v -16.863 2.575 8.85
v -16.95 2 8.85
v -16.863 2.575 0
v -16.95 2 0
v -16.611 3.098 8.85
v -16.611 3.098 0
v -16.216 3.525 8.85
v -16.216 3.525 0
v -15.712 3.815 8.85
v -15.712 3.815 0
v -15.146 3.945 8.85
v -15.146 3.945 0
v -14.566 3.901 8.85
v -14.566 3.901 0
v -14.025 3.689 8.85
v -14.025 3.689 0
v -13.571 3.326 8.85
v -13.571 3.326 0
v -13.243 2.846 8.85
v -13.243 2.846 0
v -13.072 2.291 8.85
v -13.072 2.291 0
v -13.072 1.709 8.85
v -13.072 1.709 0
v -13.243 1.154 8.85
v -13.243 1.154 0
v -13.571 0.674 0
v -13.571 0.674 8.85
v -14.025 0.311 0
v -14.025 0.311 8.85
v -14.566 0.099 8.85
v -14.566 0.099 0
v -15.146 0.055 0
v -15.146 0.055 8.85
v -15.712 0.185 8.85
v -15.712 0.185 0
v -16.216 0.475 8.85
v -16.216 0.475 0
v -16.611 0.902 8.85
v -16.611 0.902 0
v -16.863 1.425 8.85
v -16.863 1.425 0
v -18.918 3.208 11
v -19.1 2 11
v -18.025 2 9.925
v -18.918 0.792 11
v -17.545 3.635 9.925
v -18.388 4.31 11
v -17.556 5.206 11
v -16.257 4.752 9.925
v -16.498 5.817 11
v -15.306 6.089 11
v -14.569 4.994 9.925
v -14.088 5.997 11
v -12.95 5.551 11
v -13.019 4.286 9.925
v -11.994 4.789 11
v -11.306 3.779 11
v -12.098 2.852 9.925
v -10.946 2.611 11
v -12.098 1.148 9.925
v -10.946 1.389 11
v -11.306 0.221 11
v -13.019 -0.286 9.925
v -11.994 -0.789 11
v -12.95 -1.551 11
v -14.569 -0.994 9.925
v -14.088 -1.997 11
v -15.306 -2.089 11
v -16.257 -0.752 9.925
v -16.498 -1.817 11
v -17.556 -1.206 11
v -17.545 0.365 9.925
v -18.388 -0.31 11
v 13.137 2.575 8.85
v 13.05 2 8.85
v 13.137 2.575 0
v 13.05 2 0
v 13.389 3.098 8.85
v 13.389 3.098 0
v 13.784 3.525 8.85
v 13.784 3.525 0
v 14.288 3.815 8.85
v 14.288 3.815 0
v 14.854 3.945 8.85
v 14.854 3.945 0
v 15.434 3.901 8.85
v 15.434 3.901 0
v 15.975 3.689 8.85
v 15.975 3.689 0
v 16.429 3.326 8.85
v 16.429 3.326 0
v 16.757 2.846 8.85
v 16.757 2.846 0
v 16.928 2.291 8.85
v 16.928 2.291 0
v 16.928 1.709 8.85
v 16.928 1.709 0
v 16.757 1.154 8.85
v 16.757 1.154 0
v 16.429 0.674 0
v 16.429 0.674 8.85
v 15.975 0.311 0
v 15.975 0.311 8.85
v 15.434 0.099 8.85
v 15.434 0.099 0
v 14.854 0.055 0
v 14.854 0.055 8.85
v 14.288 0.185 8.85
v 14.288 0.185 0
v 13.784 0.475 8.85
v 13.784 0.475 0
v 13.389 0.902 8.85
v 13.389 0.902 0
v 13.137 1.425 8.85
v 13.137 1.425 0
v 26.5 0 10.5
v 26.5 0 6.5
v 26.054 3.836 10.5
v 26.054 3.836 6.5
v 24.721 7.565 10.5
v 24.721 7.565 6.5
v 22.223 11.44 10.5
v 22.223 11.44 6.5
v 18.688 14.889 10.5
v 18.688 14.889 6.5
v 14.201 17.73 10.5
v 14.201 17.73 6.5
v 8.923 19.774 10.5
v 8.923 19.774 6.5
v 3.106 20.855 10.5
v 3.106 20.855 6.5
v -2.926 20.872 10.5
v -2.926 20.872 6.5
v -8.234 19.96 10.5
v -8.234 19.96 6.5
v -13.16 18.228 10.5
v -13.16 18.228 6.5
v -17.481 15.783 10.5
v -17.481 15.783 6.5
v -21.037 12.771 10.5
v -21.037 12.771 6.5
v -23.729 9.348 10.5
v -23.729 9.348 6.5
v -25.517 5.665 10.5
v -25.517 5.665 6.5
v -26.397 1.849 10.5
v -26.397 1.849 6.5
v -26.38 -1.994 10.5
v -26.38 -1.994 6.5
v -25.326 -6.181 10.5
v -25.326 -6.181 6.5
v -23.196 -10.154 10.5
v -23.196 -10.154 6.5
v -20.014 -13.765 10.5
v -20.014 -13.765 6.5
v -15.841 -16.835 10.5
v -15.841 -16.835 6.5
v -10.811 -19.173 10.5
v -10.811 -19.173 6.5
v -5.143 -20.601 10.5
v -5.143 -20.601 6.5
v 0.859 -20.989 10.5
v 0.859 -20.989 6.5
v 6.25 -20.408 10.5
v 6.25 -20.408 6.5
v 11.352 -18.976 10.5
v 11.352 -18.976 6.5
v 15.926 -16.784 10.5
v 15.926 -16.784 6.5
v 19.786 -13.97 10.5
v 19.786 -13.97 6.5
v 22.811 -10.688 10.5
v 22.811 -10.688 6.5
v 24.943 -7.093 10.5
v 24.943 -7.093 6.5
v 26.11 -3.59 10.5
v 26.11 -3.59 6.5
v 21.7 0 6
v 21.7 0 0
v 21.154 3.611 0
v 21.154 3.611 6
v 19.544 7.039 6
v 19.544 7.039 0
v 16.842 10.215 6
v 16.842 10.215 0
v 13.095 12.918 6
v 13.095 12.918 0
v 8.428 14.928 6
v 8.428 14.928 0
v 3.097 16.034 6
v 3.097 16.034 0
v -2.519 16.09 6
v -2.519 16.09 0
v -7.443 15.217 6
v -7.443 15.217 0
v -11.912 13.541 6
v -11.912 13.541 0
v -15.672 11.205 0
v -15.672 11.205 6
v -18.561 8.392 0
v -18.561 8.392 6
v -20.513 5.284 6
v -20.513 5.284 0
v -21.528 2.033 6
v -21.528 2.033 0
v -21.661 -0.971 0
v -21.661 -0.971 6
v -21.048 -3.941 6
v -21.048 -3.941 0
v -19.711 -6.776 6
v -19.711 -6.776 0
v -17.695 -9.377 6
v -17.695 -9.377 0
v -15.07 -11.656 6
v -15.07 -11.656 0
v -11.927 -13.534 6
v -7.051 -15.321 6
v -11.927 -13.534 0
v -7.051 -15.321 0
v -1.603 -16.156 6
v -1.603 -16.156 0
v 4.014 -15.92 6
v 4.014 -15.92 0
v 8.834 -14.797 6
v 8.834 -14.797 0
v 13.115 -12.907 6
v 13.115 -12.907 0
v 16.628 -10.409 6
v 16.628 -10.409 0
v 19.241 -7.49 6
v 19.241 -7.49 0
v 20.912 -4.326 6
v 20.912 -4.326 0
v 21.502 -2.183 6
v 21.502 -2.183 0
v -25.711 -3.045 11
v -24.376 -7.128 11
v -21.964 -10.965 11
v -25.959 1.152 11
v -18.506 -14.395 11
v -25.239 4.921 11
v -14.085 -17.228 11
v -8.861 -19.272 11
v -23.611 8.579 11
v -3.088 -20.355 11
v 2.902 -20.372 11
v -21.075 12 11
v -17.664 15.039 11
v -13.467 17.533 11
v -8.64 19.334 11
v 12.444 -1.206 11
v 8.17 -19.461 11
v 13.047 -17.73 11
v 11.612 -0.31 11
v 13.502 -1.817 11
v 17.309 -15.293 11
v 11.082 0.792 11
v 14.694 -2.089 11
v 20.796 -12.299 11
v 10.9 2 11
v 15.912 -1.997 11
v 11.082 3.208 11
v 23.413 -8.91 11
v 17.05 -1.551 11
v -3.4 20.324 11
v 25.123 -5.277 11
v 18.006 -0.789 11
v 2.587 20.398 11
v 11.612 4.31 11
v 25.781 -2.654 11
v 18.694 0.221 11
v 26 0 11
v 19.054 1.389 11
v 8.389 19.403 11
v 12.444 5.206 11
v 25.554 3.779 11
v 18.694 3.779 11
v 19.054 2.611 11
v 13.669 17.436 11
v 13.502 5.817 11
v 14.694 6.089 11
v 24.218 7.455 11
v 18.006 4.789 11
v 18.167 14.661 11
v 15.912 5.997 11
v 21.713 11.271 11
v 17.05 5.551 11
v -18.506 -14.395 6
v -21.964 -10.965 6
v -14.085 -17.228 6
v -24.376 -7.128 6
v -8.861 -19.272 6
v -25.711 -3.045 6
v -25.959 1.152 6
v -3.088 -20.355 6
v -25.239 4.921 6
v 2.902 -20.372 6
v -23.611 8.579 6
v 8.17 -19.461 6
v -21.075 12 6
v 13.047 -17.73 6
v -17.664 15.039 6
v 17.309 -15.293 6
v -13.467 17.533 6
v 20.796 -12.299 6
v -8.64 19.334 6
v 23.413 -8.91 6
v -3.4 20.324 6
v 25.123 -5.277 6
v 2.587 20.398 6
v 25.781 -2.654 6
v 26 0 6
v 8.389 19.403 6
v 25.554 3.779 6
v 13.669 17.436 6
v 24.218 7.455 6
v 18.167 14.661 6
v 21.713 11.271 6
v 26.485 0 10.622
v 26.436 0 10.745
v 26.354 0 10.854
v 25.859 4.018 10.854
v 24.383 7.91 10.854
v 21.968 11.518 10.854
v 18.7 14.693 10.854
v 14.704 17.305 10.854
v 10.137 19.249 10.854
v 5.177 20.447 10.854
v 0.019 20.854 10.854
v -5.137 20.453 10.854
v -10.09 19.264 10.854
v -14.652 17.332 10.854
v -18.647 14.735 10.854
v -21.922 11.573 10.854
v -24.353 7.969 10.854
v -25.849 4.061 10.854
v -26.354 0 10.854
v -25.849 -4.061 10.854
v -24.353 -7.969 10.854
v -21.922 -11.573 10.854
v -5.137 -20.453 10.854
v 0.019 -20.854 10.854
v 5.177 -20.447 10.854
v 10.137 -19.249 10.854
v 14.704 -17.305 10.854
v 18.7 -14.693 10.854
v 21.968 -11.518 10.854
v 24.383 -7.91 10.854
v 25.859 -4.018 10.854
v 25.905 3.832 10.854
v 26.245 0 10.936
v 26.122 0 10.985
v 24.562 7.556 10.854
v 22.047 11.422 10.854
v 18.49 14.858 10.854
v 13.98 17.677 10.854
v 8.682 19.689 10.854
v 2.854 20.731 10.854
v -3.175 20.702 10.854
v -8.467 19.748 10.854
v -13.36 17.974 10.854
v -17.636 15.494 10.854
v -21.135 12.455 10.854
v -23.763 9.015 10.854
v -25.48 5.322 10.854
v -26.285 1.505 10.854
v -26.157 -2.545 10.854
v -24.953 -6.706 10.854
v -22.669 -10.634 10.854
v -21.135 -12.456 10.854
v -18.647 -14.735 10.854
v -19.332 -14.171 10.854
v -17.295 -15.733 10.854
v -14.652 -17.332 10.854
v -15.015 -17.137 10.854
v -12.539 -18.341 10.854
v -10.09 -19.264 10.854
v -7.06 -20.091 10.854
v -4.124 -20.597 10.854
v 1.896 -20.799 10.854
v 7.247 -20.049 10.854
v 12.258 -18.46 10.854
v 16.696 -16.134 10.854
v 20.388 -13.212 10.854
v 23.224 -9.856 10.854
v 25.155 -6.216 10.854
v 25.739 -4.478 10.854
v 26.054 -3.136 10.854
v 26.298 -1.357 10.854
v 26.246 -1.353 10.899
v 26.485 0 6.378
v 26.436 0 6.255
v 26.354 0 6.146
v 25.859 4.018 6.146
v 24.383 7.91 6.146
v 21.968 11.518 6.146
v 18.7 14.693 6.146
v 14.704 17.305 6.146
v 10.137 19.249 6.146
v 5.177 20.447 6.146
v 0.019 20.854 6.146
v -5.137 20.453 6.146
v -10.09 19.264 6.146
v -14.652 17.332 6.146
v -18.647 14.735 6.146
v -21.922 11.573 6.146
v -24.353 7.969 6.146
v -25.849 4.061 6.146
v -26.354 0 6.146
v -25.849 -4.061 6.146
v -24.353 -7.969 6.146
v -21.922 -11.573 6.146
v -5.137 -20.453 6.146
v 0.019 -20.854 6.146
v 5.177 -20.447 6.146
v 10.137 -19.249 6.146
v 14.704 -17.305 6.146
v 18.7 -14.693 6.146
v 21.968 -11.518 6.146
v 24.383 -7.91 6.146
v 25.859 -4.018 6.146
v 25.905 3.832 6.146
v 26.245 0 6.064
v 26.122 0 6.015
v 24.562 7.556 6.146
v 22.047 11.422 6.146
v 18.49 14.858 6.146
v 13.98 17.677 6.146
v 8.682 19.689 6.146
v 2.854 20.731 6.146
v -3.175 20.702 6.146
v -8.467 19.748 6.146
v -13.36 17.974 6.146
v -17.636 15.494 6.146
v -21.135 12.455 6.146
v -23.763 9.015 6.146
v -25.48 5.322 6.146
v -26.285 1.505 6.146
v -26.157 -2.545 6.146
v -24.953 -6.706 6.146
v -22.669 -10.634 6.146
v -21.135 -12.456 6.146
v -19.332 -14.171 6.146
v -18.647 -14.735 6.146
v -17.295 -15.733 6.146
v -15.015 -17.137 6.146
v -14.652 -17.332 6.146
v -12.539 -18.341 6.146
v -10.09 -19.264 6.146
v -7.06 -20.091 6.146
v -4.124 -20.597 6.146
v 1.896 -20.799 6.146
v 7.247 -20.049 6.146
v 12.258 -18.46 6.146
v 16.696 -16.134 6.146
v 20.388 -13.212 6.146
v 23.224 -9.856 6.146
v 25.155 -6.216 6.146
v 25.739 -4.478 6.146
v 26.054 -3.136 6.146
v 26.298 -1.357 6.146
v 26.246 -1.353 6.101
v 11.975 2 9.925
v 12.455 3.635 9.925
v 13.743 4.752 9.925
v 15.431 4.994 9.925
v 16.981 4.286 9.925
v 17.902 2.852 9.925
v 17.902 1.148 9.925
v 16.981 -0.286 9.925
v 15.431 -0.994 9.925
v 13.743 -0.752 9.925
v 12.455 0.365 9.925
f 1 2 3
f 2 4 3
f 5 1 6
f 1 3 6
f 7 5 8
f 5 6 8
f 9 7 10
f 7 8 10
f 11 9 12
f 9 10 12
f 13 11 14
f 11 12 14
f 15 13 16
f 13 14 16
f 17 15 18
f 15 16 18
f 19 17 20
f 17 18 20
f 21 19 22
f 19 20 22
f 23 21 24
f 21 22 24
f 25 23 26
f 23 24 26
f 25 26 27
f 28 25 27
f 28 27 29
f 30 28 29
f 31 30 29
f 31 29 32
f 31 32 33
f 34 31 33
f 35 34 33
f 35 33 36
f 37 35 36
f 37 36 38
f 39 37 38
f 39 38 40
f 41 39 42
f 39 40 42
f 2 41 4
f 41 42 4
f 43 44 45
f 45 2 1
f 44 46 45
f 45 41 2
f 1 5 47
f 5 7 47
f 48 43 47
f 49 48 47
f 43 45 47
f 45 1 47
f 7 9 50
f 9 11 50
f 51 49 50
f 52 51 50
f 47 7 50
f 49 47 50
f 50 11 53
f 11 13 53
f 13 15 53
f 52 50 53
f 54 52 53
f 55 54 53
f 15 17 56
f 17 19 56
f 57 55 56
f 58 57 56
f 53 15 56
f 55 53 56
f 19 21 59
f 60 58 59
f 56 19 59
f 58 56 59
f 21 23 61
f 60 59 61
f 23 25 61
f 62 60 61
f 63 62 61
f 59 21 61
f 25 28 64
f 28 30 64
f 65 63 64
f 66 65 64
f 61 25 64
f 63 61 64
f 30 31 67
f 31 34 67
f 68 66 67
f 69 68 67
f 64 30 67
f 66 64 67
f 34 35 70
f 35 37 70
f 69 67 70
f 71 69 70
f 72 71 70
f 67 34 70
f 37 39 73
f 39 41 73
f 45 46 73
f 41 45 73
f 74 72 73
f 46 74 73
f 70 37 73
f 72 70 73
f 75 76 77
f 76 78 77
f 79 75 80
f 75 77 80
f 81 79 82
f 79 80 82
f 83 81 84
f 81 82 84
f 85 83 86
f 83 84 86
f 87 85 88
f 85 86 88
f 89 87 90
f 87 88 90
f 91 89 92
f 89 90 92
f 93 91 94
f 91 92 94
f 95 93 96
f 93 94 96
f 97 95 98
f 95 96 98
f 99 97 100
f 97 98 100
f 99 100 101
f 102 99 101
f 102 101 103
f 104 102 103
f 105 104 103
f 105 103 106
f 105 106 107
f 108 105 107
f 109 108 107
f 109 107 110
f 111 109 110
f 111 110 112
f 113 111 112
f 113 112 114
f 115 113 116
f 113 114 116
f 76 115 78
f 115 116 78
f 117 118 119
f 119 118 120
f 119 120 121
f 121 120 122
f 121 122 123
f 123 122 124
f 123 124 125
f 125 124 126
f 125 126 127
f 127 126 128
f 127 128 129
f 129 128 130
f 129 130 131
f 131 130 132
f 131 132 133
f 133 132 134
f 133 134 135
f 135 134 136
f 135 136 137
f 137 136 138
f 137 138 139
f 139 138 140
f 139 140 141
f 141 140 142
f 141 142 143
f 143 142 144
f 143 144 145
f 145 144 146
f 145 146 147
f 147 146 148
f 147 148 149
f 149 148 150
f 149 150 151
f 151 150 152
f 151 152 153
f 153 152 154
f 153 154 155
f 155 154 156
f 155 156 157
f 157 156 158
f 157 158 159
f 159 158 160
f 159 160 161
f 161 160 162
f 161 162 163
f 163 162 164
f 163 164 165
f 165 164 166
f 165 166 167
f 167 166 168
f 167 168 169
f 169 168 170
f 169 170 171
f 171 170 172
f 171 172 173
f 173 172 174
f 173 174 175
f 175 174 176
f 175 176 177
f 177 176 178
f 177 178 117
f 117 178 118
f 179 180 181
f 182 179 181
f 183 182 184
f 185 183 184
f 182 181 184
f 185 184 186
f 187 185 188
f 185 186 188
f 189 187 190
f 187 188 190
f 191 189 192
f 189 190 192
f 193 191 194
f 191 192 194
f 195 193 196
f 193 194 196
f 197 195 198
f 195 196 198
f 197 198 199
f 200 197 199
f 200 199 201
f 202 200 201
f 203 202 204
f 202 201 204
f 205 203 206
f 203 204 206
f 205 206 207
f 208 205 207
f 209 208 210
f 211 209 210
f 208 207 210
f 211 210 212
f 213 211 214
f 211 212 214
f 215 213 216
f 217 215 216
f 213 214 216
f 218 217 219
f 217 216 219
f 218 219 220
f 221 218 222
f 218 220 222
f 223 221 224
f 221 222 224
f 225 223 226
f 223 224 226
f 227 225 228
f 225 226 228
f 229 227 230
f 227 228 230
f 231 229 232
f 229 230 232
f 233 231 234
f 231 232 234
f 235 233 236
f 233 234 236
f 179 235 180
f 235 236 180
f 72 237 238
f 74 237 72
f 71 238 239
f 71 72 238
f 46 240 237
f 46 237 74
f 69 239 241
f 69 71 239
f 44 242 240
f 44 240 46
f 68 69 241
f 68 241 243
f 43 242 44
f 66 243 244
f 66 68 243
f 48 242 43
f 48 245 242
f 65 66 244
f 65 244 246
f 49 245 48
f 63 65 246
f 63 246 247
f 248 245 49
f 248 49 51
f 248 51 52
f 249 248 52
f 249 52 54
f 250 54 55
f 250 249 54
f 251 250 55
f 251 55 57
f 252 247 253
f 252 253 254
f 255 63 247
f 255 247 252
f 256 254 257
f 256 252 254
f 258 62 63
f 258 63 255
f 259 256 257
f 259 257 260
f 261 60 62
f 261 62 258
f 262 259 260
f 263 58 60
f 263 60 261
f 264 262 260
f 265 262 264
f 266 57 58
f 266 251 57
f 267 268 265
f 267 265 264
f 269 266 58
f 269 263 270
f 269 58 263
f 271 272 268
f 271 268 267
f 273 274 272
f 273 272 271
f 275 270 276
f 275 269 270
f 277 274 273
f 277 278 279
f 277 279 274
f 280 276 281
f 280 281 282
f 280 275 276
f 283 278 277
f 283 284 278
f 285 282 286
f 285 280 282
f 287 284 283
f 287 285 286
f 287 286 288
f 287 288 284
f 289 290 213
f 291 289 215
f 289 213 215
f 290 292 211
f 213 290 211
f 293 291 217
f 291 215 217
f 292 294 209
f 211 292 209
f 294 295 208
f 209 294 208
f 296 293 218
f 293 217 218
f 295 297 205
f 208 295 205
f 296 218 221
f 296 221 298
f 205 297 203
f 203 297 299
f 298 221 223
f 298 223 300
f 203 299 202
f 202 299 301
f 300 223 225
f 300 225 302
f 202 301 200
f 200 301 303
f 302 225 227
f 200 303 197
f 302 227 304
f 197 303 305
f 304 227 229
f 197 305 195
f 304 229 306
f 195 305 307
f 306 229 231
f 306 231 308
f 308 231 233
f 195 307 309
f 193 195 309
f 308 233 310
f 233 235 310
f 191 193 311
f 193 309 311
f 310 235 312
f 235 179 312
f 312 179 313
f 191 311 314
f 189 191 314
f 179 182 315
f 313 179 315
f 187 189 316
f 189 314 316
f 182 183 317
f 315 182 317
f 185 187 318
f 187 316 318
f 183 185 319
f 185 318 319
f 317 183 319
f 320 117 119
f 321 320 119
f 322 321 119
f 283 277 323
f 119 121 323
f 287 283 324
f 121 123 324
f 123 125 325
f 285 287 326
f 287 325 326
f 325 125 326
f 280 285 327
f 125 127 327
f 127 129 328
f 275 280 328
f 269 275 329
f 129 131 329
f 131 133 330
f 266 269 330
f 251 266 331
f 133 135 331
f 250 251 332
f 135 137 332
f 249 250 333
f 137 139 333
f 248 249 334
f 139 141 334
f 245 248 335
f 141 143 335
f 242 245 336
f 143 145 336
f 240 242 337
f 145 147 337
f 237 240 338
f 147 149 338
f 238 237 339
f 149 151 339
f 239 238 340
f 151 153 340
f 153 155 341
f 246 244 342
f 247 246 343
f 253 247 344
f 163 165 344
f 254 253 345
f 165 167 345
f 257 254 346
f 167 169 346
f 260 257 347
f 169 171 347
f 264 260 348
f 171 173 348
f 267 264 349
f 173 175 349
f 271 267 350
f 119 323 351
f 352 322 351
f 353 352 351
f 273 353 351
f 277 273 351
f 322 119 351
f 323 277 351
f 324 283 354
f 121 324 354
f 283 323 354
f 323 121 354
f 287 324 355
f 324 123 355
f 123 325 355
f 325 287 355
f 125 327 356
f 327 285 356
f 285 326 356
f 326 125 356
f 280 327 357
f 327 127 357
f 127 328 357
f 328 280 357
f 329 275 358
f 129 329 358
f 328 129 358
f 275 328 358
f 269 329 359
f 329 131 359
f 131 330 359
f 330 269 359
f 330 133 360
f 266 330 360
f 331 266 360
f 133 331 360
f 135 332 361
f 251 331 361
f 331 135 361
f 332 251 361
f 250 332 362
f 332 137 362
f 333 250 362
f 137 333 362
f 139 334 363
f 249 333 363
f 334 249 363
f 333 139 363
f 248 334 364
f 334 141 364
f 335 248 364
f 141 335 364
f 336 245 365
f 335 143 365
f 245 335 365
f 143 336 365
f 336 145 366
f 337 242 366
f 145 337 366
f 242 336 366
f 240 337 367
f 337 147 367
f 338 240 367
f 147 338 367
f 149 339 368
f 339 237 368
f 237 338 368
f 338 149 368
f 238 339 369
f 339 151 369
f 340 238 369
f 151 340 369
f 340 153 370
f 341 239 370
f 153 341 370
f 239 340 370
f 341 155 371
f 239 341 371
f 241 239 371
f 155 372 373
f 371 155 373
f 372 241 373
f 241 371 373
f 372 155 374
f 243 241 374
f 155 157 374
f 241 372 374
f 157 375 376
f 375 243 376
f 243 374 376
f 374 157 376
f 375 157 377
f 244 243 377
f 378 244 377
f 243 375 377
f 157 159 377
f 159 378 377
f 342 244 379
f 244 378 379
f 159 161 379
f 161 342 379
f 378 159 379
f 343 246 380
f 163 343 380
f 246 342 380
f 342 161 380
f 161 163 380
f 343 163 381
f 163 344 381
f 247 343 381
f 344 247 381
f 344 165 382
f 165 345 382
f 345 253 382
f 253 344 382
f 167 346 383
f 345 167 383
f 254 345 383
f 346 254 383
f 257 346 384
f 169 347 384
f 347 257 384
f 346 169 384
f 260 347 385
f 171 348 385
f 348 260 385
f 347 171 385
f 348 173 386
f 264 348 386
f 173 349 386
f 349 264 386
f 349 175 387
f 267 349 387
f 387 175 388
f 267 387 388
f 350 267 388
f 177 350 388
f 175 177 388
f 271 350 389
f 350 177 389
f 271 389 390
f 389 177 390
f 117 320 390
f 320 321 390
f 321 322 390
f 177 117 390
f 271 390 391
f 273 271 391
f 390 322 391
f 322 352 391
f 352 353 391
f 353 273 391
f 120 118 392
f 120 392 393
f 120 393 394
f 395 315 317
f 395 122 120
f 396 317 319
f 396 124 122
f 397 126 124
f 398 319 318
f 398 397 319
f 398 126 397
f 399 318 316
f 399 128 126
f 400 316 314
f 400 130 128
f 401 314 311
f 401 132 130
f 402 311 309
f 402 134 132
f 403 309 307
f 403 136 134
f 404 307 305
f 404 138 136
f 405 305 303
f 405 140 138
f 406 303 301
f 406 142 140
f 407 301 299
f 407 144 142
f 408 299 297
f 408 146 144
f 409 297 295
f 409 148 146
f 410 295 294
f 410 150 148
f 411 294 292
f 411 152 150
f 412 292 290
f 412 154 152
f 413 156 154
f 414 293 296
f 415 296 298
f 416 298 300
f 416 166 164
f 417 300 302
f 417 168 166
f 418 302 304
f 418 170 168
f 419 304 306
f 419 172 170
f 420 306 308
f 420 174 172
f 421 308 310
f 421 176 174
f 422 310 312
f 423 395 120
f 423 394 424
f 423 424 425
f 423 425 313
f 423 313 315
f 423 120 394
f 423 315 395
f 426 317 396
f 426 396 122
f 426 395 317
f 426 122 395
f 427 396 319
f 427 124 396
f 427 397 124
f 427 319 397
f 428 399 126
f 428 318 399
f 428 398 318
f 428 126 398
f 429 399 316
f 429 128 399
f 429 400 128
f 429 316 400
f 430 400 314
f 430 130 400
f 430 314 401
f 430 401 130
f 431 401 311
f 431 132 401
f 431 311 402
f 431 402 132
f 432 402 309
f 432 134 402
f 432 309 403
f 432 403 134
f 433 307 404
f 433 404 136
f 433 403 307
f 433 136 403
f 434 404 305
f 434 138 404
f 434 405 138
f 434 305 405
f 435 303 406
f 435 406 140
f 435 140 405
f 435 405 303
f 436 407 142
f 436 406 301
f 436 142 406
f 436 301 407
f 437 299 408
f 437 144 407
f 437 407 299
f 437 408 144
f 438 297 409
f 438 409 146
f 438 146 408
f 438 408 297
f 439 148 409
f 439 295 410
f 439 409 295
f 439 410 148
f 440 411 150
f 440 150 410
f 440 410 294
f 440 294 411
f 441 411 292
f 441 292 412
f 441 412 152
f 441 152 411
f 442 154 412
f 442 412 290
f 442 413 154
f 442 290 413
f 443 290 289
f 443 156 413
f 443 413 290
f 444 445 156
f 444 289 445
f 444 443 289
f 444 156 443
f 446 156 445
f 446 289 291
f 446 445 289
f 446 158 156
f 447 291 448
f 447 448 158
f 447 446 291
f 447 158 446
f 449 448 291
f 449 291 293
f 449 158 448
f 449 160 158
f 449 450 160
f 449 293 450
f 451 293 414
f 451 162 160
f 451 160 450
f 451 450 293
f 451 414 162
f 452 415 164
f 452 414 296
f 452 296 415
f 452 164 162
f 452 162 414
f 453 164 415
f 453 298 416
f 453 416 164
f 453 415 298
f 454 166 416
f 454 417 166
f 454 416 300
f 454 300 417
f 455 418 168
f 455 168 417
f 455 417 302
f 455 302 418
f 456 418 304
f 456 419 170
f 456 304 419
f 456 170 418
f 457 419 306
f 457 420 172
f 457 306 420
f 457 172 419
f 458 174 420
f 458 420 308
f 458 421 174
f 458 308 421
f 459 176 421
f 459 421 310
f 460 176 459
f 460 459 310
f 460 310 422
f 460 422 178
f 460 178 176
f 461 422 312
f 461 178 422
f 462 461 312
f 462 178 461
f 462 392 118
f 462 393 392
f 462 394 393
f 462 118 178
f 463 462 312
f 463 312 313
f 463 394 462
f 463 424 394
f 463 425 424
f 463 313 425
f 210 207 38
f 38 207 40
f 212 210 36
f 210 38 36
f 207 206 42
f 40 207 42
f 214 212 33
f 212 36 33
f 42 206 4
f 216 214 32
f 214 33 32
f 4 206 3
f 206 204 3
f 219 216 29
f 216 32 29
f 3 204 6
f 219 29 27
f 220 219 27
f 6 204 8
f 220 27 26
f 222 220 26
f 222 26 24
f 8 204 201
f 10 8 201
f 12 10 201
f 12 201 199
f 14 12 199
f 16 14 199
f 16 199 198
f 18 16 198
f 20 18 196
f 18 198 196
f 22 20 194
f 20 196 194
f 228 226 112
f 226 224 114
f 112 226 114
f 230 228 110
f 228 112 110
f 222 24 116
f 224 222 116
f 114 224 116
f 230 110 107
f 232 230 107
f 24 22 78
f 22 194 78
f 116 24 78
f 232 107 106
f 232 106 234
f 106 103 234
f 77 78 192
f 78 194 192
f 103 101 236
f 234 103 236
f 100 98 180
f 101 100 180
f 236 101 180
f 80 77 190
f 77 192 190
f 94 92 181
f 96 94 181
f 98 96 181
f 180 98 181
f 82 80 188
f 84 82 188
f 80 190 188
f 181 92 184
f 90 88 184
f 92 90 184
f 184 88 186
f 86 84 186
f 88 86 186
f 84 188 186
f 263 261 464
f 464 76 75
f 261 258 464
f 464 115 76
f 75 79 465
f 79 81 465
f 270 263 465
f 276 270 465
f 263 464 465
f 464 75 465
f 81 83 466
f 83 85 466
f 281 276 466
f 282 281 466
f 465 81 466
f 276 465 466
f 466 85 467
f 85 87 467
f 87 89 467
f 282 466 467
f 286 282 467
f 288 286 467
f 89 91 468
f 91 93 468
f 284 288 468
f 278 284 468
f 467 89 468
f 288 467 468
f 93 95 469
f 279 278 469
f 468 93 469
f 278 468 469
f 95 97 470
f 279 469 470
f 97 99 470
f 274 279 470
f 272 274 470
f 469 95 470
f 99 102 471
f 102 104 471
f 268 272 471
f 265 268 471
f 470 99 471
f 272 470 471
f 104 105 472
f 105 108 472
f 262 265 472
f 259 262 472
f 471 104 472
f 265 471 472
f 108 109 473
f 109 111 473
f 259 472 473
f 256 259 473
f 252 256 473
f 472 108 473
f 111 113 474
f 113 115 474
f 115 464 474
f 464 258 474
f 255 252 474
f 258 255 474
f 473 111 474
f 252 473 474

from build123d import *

# Parameters (mm, degrees)
SKIZZE1_RX                                           = 21.7
SKIZZE1_RY                                           = 16.2
AUFSATZ_LINEAR_AUSTRAGEN1_DEPTH                      = 6
SKIZZE2_RX                                           = 26.5
SKIZZE2_RY                                           = 21
AUFSATZ_LINEAR_AUSTRAGEN2_DEPTH                      = 5
FORMSENKUNG_F_R_M3_5_LINSENSENKSCHRAUBE1_D           = 3.9
FORMSENKUNG_F_R_M3_5_LINSENSENKSCHRAUBE1_CSINK_D     = 8.2
FORMSENKUNG_F_R_M3_5_LINSENSENKSCHRAUBE1_CSINK_ANGLE = 90
VERRUNDUNG1_R                                        = 0.5


with BuildPart() as part:
    # Skizze1 → Aufsatz-Linear austragen1 (new body)
    with BuildSketch(Plane.XY):
        with Locations((0, 0)):
            Ellipse(SKIZZE1_RX, SKIZZE1_RY)
    extrude(amount=AUFSATZ_LINEAR_AUSTRAGEN1_DEPTH)

    # Skizze2 → Aufsatz-Linear austragen2 (add)
    with BuildSketch(Plane.XY.offset(6)):
        with Locations((0, 0)):
            Ellipse(SKIZZE2_RX, SKIZZE2_RY)
    extrude(amount=AUFSATZ_LINEAR_AUSTRAGEN2_DEPTH)

    # Formsenkung für M3.5 Linsensenkschraube1 (through all)
    with Locations(Plane(origin=(-15, 2, 11), x_dir=(1, 0, 0), z_dir=(0, 0, 1))):
        with Locations((0, 0), (30, 0)):
            CounterSinkHole(FORMSENKUNG_F_R_M3_5_LINSENSENKSCHRAUBE1_D / 2, FORMSENKUNG_F_R_M3_5_LINSENSENKSCHRAUBE1_CSINK_D / 2, counter_sink_angle=FORMSENKUNG_F_R_M3_5_LINSENSENKSCHRAUBE1_CSINK_ANGLE)

    # Verrundung1
    verrundung1_edges = [part.edges().sort_by_distance(p)[0] for p in [
        (-26.499999579, -0.00374494, 6),
        (-26.499999579, -0.00374494, 11),
    ]]
    fillet(verrundung1_edges, radius=VERRUNDUNG1_R)


solid = part.part
